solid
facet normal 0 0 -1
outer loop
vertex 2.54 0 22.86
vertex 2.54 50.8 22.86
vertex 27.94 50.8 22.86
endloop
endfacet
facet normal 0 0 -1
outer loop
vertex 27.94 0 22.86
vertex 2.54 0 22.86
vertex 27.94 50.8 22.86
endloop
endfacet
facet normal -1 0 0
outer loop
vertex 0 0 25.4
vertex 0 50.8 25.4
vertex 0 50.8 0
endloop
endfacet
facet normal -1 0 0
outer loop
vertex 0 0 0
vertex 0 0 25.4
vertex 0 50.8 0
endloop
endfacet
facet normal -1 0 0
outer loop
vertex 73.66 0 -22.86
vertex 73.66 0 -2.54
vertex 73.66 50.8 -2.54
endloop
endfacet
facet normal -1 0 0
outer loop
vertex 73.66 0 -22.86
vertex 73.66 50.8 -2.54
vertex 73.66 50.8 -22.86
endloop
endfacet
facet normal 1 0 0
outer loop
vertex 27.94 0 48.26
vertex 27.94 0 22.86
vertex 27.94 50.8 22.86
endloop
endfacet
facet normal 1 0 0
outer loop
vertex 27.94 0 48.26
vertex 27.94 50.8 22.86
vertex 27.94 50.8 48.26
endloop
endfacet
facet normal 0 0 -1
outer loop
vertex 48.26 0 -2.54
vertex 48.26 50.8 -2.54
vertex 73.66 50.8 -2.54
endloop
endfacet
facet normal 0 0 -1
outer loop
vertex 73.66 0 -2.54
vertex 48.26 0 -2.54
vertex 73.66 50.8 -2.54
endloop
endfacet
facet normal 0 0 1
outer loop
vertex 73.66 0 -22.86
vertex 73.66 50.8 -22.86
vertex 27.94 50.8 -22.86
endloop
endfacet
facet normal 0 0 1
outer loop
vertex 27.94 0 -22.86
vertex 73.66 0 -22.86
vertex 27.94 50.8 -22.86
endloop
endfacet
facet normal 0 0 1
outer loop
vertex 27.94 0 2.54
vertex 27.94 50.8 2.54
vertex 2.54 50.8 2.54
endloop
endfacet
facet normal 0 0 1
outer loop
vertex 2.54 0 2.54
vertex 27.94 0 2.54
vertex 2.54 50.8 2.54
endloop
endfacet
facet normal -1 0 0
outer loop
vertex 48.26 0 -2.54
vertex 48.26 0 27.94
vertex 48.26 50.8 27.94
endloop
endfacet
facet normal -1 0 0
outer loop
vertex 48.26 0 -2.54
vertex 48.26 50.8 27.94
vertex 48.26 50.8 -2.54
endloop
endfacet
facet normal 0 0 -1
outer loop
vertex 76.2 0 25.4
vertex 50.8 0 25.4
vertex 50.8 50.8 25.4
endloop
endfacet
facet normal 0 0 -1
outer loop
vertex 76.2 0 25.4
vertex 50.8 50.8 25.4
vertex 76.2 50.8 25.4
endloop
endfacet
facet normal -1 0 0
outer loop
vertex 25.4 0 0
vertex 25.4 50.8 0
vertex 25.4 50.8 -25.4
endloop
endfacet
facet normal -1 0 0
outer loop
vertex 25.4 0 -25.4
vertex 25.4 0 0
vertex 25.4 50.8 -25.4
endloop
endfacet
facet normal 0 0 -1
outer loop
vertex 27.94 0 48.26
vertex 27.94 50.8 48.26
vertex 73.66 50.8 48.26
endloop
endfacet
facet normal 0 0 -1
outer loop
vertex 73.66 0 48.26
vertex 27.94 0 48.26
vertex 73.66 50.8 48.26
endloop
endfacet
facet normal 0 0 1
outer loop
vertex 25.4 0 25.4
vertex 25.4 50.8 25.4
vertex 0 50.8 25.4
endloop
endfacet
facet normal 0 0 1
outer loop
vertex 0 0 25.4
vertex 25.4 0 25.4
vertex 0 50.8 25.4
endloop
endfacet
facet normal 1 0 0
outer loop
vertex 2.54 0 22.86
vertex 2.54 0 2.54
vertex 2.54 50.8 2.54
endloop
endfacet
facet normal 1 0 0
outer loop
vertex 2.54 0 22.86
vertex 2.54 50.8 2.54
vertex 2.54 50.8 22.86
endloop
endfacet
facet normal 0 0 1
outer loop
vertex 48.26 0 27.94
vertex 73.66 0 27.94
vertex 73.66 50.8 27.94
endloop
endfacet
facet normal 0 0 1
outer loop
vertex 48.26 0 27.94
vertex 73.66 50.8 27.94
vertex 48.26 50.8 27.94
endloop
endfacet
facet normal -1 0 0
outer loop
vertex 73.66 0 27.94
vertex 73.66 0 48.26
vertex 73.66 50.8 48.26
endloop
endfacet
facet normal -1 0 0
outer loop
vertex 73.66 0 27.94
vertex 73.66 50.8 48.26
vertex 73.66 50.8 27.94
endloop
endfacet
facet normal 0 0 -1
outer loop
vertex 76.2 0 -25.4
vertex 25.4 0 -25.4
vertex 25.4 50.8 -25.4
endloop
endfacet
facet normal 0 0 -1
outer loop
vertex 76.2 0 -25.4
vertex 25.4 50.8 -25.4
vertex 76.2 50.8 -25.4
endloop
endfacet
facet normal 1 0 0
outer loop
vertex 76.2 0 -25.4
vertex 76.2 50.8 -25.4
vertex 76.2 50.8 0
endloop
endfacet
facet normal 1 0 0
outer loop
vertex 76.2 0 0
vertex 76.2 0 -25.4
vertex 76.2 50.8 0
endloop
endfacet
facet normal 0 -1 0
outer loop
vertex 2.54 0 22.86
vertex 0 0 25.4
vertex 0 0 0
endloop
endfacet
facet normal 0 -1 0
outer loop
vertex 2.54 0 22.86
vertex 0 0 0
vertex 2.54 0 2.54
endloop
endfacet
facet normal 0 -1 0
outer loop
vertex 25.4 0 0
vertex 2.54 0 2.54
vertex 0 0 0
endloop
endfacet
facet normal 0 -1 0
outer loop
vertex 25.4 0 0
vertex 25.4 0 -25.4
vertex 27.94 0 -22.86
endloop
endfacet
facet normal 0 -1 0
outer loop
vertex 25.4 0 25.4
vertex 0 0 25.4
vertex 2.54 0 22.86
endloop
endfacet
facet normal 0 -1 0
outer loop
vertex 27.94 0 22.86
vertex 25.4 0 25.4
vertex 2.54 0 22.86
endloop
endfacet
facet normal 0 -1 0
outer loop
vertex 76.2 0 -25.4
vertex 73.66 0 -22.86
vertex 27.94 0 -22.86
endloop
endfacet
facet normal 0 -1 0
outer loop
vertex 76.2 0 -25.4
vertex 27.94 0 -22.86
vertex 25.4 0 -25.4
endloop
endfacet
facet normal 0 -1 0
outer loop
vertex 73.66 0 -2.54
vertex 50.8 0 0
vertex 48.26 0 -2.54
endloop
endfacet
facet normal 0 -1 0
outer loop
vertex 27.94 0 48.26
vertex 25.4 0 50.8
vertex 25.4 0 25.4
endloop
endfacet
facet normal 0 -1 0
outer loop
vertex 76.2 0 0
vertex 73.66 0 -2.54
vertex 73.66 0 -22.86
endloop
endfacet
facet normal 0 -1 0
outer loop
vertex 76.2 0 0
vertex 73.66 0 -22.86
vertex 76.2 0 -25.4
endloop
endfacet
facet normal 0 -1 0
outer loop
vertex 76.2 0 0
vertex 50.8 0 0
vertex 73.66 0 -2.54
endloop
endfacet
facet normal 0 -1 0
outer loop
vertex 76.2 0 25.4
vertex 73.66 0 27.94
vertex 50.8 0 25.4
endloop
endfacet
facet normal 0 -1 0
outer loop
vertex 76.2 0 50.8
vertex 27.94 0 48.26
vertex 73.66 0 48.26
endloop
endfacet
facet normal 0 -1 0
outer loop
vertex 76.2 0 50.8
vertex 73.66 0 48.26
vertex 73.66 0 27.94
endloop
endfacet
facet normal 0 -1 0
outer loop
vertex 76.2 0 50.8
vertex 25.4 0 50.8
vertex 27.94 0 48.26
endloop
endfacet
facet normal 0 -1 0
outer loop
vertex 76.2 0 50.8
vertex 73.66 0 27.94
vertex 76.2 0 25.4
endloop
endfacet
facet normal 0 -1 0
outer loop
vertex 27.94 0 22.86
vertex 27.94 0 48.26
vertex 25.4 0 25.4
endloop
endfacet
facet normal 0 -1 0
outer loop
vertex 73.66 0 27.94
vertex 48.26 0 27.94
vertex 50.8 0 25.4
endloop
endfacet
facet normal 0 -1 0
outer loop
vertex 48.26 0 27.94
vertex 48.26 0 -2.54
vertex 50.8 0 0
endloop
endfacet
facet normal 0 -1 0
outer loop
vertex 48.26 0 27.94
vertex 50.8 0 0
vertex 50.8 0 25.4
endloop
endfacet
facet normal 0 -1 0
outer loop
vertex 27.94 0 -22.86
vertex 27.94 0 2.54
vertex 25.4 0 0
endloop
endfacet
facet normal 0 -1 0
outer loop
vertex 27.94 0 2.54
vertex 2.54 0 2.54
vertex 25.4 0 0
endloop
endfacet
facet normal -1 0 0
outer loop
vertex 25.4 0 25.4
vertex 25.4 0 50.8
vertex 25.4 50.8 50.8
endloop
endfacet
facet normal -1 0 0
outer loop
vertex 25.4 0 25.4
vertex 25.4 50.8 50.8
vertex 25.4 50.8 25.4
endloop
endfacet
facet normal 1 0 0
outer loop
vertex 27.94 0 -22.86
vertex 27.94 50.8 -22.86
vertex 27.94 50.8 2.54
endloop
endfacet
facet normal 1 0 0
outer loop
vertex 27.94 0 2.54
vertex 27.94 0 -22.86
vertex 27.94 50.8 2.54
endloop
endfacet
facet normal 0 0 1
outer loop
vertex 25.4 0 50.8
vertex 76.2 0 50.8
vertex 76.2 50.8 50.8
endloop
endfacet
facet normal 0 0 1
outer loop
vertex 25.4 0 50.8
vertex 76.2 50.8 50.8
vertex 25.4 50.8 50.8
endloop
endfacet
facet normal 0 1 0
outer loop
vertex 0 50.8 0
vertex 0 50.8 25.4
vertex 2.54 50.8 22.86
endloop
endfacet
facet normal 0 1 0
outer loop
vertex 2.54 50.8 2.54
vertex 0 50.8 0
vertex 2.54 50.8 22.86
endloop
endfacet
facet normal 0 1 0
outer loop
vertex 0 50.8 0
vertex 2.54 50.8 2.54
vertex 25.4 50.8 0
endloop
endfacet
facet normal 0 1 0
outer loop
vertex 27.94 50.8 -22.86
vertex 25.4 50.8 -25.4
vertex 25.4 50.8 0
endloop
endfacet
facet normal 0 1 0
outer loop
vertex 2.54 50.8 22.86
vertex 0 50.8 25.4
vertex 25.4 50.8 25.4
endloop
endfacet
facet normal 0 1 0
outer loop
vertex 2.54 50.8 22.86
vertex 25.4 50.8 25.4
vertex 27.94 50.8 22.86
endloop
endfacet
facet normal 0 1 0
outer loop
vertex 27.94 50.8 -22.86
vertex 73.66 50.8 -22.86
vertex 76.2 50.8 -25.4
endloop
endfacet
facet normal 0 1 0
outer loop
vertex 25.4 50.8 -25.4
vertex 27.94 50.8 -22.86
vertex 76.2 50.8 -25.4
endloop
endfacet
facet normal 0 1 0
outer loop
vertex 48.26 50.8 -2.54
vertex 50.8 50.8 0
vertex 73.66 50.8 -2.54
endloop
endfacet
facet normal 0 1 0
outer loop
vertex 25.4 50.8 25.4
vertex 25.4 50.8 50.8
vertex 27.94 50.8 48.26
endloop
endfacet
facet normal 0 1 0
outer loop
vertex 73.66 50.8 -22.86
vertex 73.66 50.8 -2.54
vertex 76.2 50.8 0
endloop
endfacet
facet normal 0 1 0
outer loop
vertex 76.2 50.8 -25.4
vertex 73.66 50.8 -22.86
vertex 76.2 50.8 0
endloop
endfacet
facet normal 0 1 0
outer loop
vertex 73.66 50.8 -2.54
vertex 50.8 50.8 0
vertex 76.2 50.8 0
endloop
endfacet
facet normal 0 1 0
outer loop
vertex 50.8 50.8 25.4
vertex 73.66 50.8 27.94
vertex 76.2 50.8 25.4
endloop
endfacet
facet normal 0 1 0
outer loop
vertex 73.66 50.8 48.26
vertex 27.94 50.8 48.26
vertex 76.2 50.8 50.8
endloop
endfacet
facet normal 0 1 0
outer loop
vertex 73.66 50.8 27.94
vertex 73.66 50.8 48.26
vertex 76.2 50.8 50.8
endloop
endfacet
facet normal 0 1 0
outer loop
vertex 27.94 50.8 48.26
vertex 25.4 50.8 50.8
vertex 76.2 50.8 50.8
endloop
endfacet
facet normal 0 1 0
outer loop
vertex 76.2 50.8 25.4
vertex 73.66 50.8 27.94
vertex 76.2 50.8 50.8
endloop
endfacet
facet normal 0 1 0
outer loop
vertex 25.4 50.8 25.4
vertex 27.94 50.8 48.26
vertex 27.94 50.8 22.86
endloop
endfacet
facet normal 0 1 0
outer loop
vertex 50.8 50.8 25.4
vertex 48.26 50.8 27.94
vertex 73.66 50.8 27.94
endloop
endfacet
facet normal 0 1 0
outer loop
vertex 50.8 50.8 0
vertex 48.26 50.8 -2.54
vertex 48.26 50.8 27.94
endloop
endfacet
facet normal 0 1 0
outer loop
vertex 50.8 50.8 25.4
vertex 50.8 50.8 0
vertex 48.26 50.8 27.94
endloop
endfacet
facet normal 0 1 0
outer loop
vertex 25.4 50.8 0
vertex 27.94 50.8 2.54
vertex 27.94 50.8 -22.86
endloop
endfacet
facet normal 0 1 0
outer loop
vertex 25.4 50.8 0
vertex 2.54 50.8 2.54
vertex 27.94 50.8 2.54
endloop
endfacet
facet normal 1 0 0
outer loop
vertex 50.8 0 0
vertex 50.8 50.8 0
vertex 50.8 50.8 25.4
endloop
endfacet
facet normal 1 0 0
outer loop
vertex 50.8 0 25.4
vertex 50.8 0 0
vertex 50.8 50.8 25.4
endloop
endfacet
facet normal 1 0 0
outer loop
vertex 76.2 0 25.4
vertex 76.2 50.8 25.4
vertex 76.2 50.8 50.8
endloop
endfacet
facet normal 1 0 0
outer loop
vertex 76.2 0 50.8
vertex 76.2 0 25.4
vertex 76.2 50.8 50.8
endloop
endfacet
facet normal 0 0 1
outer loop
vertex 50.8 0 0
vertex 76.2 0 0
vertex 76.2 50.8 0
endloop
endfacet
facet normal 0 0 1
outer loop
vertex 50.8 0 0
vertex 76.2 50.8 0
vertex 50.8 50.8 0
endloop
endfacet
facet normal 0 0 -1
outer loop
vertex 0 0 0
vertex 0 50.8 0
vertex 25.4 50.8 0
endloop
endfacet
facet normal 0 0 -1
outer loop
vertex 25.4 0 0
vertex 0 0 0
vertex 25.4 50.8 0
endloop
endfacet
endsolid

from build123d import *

# Parameters (mm, degrees)
F2_DEPTH = 50.8


with BuildPart() as f2:
    # F1 (on face) → F2 (new body)
    with BuildSketch(Plane.XZ):
        Polygon((25.4, 25.4), (0, 25.4), (0, 0), (25.4, 0), (25.4, -25.4), (76.2, -25.4), (76.2, 0), (50.8, 0), (50.8, 25.4), (76.2, 25.4), (76.2, 50.8), (25.4, 50.8), align=None)
        Polygon((2.54, 22.86), (27.94, 22.86), (27.94, 48.26), (73.66, 48.26), (73.66, 27.94), (48.26, 27.94), (48.26, -2.54), (73.66, -2.54), (73.66, -22.86), (27.94, -22.86), (27.94, 2.54), (2.54, 2.54), align=None, mode=Mode.SUBTRACT)
    extrude(amount=-F2_DEPTH)


solid = f2.part
